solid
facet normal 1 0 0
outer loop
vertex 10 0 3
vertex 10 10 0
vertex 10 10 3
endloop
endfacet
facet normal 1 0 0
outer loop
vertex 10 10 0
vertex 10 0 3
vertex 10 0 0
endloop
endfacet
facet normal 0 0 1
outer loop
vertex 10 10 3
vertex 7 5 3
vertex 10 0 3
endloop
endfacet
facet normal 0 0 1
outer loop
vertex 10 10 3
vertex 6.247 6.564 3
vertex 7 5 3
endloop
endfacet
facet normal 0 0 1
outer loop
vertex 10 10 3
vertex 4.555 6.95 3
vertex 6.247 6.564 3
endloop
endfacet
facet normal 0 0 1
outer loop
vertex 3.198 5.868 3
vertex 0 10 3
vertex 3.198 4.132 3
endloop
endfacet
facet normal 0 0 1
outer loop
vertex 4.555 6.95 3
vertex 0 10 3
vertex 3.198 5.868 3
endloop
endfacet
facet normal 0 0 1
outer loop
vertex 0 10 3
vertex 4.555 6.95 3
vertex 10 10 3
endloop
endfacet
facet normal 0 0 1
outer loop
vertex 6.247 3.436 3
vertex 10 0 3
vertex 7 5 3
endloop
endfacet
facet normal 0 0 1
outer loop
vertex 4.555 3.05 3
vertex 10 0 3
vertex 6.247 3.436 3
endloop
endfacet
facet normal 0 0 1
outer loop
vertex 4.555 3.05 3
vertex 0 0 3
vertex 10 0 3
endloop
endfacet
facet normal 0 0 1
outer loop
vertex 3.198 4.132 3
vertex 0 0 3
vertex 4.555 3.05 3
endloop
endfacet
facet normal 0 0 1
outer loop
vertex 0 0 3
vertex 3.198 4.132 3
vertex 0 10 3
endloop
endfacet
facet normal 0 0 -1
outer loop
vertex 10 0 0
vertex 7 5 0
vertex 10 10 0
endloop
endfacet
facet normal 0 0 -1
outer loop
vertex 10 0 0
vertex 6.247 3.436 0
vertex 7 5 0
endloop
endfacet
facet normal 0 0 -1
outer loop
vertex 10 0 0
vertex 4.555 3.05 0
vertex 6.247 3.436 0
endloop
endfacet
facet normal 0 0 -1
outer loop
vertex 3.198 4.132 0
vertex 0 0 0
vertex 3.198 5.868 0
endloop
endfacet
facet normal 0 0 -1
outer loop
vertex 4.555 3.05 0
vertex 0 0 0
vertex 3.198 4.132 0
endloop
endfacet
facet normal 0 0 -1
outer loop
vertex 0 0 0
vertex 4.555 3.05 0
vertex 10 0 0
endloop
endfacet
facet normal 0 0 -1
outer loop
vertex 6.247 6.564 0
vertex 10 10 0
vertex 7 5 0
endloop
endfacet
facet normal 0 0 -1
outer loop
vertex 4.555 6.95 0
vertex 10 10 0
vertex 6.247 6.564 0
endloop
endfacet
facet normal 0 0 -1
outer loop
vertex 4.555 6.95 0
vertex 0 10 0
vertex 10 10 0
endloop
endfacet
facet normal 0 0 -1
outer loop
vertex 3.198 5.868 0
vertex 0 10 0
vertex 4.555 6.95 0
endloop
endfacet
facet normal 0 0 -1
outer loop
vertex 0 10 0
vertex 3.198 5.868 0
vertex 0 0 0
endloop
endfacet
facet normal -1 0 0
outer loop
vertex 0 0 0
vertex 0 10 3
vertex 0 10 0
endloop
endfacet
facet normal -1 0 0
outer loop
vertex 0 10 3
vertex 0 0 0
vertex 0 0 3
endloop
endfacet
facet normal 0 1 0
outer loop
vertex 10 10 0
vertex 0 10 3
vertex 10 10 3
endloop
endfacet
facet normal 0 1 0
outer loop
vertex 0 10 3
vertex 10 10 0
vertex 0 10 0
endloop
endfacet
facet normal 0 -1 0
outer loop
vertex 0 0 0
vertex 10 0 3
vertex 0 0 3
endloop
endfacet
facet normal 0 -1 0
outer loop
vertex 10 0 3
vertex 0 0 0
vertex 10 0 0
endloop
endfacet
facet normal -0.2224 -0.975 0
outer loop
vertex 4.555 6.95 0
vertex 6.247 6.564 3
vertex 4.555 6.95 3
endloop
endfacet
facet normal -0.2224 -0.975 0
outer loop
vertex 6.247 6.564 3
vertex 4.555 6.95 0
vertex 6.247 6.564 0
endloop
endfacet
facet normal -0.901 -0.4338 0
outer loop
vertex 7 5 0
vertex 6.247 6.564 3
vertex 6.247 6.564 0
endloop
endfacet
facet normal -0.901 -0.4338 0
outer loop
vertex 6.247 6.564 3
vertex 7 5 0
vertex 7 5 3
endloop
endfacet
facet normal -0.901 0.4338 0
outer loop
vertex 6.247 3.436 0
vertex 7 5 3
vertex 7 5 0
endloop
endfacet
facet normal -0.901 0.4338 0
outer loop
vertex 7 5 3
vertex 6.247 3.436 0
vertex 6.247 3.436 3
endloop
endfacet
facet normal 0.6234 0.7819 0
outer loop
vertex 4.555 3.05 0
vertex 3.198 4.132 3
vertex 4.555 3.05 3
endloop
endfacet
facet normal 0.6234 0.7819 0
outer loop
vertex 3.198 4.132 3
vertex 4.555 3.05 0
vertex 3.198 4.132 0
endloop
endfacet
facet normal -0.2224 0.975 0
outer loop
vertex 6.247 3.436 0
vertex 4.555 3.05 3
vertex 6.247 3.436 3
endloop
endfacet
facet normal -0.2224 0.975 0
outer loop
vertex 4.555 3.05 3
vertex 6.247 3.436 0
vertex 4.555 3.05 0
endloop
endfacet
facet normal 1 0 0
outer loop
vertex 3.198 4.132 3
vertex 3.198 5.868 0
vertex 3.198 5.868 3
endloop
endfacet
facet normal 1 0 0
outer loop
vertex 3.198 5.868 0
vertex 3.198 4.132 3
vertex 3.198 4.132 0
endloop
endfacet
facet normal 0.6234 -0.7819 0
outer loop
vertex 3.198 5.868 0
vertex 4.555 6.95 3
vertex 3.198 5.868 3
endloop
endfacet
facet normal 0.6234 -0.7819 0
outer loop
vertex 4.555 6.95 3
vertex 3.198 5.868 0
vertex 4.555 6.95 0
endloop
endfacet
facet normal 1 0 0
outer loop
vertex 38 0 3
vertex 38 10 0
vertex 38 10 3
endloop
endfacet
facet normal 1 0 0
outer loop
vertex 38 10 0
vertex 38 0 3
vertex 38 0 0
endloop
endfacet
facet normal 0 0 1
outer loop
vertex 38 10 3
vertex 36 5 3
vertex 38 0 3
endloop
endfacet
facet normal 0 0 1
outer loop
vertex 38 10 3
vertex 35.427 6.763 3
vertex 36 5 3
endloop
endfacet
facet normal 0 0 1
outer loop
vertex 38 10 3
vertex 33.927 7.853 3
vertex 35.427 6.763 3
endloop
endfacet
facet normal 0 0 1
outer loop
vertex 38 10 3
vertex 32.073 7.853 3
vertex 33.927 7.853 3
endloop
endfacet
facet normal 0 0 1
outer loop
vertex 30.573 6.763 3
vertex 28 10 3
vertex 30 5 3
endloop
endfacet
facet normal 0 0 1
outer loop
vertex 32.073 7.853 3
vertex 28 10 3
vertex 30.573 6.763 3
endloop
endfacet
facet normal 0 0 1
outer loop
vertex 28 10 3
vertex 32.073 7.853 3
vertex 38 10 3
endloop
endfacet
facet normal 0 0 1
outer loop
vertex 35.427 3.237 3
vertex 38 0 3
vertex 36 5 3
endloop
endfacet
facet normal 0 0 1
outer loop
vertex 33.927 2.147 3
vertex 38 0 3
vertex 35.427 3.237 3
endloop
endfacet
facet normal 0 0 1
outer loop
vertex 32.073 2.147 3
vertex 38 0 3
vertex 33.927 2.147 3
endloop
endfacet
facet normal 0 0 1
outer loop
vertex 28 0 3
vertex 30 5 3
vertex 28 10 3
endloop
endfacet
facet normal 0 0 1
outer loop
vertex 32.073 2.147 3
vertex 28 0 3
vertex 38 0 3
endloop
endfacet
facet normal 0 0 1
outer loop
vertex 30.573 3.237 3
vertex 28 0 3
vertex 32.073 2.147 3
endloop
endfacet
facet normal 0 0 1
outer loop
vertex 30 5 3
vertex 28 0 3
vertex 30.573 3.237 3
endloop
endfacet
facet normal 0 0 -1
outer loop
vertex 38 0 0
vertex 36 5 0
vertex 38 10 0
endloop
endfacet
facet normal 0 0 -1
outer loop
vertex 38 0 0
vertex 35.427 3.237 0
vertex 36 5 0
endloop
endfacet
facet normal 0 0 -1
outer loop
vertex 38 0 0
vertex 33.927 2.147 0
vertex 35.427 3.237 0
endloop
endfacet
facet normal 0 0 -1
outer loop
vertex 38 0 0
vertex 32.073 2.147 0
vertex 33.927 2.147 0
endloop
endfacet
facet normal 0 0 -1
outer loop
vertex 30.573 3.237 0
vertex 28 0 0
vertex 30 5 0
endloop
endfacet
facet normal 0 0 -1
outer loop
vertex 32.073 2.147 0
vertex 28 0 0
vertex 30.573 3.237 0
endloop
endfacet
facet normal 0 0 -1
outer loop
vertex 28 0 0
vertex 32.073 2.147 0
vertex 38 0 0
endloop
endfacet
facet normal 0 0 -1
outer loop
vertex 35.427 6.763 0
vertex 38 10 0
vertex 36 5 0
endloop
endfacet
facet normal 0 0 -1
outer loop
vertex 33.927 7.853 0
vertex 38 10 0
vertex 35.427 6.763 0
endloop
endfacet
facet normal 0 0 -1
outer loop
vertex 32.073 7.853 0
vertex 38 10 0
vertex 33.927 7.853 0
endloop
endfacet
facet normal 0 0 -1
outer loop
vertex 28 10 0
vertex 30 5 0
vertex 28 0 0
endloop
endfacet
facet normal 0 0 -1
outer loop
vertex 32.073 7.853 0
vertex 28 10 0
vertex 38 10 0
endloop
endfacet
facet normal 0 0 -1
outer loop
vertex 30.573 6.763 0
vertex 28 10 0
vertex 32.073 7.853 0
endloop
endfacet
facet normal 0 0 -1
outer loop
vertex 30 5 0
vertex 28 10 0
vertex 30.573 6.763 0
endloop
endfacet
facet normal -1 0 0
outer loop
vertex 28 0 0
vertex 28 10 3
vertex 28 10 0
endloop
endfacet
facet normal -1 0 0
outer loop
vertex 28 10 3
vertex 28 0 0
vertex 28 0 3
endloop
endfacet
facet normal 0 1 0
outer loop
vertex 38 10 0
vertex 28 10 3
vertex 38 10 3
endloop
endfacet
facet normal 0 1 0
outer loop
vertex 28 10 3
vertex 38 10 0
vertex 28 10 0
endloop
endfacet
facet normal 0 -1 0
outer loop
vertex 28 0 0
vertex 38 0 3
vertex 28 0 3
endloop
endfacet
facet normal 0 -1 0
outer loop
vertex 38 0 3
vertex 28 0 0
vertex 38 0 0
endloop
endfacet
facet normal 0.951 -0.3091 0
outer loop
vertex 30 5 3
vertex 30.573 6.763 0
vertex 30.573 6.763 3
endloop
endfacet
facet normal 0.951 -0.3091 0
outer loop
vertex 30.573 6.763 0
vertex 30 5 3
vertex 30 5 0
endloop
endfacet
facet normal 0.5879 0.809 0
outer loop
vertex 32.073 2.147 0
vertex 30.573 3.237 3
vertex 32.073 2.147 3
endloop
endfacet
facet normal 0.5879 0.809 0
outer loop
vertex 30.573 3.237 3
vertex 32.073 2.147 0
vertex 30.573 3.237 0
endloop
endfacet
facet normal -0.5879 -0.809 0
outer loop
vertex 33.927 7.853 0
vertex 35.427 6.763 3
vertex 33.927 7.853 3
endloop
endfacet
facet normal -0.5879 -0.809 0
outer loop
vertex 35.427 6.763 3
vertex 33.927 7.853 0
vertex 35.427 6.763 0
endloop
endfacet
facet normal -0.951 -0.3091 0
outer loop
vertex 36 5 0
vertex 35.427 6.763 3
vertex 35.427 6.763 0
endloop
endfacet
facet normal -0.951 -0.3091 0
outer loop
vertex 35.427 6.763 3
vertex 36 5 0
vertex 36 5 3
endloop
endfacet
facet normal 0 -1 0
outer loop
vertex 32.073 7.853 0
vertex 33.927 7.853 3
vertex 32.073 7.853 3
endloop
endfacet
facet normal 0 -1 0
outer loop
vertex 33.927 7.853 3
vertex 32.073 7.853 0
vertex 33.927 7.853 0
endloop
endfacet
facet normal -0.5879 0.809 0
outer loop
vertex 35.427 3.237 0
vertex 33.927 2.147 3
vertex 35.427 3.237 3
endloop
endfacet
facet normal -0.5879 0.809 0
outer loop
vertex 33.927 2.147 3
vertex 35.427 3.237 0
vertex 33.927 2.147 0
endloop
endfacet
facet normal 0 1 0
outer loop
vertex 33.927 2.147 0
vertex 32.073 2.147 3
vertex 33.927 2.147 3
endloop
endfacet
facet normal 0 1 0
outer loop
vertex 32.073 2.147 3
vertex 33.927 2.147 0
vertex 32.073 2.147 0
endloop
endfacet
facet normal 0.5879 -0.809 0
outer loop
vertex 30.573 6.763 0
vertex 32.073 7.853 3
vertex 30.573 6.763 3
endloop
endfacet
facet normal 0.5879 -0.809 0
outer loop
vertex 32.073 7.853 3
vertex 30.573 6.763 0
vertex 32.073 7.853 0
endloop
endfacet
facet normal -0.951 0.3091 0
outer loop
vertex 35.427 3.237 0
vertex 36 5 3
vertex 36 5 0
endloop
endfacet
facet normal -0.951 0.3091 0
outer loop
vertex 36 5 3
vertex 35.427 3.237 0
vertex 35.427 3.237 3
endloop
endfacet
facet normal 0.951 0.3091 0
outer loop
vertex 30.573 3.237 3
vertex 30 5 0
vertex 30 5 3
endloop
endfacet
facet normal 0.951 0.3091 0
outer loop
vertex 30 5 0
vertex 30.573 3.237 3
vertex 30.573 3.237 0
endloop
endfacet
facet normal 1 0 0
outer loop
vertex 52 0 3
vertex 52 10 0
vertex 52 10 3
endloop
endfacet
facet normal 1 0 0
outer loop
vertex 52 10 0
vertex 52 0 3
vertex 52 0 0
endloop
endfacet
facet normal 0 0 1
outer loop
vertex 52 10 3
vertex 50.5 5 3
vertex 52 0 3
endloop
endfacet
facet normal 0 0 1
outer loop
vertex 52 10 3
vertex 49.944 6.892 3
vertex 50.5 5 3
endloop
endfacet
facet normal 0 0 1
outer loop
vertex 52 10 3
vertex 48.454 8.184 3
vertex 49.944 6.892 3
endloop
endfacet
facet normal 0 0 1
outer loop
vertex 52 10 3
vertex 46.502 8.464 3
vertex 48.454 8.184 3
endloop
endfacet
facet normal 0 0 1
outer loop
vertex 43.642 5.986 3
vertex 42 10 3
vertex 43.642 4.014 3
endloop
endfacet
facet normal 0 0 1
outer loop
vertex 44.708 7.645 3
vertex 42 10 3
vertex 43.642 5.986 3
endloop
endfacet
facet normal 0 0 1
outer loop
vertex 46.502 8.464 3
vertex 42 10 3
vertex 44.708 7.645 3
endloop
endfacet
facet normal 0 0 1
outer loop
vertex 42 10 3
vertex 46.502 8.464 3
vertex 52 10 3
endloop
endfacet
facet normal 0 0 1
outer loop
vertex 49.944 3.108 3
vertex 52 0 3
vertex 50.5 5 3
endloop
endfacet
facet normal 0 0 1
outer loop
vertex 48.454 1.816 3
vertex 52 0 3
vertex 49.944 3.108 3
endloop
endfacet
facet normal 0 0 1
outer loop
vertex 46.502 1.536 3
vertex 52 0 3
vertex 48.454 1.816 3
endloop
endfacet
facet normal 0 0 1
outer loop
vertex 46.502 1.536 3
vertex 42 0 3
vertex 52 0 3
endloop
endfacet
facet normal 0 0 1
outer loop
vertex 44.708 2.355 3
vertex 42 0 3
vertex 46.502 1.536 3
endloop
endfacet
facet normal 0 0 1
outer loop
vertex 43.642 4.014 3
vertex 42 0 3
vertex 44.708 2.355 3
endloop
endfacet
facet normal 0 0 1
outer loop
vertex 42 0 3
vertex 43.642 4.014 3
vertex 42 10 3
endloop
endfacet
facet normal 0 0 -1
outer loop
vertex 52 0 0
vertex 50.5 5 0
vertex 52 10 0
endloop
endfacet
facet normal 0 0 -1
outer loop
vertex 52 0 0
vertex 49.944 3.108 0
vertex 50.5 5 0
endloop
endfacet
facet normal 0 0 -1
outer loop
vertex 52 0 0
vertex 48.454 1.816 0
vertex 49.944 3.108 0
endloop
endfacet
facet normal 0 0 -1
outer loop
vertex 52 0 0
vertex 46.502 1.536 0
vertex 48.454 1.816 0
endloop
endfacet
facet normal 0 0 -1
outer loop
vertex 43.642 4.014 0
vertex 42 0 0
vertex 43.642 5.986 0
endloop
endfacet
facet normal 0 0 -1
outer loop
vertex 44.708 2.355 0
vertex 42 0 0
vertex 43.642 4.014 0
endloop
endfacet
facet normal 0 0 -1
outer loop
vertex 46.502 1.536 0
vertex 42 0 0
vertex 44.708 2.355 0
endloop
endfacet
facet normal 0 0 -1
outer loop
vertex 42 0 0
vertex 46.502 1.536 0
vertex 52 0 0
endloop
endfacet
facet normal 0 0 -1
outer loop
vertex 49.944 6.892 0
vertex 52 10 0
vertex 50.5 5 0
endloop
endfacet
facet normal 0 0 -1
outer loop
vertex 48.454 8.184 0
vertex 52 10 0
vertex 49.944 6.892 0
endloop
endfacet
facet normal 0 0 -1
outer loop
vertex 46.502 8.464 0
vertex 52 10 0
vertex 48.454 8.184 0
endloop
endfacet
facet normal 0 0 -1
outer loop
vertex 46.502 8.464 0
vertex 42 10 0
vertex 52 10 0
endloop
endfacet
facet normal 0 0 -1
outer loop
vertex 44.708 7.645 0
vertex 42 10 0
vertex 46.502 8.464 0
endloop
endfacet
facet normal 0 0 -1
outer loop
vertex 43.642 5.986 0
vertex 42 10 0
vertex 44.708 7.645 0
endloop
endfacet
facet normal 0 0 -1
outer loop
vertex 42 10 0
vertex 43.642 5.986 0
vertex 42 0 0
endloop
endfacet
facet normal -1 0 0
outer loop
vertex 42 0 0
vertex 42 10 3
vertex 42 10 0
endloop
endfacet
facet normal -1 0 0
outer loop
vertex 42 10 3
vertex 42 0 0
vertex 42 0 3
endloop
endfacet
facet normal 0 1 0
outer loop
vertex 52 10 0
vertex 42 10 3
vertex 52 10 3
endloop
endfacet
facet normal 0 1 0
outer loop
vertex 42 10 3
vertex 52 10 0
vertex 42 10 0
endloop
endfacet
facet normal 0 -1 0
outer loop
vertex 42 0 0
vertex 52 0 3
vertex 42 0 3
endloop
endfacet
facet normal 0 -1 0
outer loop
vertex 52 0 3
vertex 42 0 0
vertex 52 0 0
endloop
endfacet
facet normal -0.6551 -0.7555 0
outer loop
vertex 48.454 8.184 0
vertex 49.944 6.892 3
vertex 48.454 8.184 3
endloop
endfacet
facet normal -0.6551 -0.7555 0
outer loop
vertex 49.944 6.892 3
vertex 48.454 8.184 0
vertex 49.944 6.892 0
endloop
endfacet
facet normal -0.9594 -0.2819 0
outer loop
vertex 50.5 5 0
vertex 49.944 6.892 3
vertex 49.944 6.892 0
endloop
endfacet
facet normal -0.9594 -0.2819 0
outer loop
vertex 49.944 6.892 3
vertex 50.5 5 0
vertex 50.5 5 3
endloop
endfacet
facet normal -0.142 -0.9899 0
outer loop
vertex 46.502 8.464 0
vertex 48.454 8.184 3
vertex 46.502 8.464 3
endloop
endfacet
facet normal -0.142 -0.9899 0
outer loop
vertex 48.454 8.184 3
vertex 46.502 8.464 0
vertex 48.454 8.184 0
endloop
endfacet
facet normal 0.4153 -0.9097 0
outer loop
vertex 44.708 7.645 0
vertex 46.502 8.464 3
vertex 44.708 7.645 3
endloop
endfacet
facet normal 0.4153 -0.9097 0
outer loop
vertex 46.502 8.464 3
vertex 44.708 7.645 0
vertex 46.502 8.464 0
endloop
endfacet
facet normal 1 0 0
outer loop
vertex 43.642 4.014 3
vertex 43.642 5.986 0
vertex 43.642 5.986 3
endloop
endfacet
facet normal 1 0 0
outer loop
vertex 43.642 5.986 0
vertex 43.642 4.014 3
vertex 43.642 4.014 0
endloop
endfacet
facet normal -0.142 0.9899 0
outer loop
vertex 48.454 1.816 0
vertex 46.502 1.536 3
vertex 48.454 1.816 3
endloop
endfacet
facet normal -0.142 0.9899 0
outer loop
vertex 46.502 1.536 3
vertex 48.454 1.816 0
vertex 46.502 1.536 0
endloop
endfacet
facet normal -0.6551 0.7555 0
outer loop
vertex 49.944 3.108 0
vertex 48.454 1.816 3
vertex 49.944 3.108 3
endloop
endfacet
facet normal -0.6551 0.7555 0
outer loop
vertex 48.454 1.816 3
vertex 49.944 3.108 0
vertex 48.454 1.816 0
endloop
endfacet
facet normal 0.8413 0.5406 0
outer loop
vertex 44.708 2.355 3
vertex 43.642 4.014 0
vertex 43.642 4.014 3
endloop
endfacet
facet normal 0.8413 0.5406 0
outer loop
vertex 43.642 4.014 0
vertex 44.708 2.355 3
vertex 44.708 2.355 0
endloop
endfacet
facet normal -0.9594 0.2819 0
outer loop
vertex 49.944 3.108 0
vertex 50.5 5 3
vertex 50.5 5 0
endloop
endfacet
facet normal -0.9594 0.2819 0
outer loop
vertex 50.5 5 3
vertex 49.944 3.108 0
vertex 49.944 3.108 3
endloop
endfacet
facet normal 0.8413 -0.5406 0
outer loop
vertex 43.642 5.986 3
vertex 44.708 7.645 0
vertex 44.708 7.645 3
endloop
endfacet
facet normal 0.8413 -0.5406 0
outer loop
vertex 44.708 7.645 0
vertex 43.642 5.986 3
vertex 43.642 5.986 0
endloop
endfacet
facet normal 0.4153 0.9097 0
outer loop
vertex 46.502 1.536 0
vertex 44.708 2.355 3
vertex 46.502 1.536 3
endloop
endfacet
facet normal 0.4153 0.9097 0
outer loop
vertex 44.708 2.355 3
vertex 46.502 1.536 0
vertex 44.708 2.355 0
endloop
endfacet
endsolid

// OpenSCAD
// M3: user module + function + for + if + children()
function spacing() = size + gap;
size = 10;
gap  = 4;

module tile(n) {
  difference() {
    cube([size, size, 3]);
    translate([size/2, size/2, -1]) cylinder(h = 5, r = 2 + n*0.5);
  }
}

for (i = [0:3])
  if (i != 1)
    translate([i * spacing(), 0, 0]) tile(i);
